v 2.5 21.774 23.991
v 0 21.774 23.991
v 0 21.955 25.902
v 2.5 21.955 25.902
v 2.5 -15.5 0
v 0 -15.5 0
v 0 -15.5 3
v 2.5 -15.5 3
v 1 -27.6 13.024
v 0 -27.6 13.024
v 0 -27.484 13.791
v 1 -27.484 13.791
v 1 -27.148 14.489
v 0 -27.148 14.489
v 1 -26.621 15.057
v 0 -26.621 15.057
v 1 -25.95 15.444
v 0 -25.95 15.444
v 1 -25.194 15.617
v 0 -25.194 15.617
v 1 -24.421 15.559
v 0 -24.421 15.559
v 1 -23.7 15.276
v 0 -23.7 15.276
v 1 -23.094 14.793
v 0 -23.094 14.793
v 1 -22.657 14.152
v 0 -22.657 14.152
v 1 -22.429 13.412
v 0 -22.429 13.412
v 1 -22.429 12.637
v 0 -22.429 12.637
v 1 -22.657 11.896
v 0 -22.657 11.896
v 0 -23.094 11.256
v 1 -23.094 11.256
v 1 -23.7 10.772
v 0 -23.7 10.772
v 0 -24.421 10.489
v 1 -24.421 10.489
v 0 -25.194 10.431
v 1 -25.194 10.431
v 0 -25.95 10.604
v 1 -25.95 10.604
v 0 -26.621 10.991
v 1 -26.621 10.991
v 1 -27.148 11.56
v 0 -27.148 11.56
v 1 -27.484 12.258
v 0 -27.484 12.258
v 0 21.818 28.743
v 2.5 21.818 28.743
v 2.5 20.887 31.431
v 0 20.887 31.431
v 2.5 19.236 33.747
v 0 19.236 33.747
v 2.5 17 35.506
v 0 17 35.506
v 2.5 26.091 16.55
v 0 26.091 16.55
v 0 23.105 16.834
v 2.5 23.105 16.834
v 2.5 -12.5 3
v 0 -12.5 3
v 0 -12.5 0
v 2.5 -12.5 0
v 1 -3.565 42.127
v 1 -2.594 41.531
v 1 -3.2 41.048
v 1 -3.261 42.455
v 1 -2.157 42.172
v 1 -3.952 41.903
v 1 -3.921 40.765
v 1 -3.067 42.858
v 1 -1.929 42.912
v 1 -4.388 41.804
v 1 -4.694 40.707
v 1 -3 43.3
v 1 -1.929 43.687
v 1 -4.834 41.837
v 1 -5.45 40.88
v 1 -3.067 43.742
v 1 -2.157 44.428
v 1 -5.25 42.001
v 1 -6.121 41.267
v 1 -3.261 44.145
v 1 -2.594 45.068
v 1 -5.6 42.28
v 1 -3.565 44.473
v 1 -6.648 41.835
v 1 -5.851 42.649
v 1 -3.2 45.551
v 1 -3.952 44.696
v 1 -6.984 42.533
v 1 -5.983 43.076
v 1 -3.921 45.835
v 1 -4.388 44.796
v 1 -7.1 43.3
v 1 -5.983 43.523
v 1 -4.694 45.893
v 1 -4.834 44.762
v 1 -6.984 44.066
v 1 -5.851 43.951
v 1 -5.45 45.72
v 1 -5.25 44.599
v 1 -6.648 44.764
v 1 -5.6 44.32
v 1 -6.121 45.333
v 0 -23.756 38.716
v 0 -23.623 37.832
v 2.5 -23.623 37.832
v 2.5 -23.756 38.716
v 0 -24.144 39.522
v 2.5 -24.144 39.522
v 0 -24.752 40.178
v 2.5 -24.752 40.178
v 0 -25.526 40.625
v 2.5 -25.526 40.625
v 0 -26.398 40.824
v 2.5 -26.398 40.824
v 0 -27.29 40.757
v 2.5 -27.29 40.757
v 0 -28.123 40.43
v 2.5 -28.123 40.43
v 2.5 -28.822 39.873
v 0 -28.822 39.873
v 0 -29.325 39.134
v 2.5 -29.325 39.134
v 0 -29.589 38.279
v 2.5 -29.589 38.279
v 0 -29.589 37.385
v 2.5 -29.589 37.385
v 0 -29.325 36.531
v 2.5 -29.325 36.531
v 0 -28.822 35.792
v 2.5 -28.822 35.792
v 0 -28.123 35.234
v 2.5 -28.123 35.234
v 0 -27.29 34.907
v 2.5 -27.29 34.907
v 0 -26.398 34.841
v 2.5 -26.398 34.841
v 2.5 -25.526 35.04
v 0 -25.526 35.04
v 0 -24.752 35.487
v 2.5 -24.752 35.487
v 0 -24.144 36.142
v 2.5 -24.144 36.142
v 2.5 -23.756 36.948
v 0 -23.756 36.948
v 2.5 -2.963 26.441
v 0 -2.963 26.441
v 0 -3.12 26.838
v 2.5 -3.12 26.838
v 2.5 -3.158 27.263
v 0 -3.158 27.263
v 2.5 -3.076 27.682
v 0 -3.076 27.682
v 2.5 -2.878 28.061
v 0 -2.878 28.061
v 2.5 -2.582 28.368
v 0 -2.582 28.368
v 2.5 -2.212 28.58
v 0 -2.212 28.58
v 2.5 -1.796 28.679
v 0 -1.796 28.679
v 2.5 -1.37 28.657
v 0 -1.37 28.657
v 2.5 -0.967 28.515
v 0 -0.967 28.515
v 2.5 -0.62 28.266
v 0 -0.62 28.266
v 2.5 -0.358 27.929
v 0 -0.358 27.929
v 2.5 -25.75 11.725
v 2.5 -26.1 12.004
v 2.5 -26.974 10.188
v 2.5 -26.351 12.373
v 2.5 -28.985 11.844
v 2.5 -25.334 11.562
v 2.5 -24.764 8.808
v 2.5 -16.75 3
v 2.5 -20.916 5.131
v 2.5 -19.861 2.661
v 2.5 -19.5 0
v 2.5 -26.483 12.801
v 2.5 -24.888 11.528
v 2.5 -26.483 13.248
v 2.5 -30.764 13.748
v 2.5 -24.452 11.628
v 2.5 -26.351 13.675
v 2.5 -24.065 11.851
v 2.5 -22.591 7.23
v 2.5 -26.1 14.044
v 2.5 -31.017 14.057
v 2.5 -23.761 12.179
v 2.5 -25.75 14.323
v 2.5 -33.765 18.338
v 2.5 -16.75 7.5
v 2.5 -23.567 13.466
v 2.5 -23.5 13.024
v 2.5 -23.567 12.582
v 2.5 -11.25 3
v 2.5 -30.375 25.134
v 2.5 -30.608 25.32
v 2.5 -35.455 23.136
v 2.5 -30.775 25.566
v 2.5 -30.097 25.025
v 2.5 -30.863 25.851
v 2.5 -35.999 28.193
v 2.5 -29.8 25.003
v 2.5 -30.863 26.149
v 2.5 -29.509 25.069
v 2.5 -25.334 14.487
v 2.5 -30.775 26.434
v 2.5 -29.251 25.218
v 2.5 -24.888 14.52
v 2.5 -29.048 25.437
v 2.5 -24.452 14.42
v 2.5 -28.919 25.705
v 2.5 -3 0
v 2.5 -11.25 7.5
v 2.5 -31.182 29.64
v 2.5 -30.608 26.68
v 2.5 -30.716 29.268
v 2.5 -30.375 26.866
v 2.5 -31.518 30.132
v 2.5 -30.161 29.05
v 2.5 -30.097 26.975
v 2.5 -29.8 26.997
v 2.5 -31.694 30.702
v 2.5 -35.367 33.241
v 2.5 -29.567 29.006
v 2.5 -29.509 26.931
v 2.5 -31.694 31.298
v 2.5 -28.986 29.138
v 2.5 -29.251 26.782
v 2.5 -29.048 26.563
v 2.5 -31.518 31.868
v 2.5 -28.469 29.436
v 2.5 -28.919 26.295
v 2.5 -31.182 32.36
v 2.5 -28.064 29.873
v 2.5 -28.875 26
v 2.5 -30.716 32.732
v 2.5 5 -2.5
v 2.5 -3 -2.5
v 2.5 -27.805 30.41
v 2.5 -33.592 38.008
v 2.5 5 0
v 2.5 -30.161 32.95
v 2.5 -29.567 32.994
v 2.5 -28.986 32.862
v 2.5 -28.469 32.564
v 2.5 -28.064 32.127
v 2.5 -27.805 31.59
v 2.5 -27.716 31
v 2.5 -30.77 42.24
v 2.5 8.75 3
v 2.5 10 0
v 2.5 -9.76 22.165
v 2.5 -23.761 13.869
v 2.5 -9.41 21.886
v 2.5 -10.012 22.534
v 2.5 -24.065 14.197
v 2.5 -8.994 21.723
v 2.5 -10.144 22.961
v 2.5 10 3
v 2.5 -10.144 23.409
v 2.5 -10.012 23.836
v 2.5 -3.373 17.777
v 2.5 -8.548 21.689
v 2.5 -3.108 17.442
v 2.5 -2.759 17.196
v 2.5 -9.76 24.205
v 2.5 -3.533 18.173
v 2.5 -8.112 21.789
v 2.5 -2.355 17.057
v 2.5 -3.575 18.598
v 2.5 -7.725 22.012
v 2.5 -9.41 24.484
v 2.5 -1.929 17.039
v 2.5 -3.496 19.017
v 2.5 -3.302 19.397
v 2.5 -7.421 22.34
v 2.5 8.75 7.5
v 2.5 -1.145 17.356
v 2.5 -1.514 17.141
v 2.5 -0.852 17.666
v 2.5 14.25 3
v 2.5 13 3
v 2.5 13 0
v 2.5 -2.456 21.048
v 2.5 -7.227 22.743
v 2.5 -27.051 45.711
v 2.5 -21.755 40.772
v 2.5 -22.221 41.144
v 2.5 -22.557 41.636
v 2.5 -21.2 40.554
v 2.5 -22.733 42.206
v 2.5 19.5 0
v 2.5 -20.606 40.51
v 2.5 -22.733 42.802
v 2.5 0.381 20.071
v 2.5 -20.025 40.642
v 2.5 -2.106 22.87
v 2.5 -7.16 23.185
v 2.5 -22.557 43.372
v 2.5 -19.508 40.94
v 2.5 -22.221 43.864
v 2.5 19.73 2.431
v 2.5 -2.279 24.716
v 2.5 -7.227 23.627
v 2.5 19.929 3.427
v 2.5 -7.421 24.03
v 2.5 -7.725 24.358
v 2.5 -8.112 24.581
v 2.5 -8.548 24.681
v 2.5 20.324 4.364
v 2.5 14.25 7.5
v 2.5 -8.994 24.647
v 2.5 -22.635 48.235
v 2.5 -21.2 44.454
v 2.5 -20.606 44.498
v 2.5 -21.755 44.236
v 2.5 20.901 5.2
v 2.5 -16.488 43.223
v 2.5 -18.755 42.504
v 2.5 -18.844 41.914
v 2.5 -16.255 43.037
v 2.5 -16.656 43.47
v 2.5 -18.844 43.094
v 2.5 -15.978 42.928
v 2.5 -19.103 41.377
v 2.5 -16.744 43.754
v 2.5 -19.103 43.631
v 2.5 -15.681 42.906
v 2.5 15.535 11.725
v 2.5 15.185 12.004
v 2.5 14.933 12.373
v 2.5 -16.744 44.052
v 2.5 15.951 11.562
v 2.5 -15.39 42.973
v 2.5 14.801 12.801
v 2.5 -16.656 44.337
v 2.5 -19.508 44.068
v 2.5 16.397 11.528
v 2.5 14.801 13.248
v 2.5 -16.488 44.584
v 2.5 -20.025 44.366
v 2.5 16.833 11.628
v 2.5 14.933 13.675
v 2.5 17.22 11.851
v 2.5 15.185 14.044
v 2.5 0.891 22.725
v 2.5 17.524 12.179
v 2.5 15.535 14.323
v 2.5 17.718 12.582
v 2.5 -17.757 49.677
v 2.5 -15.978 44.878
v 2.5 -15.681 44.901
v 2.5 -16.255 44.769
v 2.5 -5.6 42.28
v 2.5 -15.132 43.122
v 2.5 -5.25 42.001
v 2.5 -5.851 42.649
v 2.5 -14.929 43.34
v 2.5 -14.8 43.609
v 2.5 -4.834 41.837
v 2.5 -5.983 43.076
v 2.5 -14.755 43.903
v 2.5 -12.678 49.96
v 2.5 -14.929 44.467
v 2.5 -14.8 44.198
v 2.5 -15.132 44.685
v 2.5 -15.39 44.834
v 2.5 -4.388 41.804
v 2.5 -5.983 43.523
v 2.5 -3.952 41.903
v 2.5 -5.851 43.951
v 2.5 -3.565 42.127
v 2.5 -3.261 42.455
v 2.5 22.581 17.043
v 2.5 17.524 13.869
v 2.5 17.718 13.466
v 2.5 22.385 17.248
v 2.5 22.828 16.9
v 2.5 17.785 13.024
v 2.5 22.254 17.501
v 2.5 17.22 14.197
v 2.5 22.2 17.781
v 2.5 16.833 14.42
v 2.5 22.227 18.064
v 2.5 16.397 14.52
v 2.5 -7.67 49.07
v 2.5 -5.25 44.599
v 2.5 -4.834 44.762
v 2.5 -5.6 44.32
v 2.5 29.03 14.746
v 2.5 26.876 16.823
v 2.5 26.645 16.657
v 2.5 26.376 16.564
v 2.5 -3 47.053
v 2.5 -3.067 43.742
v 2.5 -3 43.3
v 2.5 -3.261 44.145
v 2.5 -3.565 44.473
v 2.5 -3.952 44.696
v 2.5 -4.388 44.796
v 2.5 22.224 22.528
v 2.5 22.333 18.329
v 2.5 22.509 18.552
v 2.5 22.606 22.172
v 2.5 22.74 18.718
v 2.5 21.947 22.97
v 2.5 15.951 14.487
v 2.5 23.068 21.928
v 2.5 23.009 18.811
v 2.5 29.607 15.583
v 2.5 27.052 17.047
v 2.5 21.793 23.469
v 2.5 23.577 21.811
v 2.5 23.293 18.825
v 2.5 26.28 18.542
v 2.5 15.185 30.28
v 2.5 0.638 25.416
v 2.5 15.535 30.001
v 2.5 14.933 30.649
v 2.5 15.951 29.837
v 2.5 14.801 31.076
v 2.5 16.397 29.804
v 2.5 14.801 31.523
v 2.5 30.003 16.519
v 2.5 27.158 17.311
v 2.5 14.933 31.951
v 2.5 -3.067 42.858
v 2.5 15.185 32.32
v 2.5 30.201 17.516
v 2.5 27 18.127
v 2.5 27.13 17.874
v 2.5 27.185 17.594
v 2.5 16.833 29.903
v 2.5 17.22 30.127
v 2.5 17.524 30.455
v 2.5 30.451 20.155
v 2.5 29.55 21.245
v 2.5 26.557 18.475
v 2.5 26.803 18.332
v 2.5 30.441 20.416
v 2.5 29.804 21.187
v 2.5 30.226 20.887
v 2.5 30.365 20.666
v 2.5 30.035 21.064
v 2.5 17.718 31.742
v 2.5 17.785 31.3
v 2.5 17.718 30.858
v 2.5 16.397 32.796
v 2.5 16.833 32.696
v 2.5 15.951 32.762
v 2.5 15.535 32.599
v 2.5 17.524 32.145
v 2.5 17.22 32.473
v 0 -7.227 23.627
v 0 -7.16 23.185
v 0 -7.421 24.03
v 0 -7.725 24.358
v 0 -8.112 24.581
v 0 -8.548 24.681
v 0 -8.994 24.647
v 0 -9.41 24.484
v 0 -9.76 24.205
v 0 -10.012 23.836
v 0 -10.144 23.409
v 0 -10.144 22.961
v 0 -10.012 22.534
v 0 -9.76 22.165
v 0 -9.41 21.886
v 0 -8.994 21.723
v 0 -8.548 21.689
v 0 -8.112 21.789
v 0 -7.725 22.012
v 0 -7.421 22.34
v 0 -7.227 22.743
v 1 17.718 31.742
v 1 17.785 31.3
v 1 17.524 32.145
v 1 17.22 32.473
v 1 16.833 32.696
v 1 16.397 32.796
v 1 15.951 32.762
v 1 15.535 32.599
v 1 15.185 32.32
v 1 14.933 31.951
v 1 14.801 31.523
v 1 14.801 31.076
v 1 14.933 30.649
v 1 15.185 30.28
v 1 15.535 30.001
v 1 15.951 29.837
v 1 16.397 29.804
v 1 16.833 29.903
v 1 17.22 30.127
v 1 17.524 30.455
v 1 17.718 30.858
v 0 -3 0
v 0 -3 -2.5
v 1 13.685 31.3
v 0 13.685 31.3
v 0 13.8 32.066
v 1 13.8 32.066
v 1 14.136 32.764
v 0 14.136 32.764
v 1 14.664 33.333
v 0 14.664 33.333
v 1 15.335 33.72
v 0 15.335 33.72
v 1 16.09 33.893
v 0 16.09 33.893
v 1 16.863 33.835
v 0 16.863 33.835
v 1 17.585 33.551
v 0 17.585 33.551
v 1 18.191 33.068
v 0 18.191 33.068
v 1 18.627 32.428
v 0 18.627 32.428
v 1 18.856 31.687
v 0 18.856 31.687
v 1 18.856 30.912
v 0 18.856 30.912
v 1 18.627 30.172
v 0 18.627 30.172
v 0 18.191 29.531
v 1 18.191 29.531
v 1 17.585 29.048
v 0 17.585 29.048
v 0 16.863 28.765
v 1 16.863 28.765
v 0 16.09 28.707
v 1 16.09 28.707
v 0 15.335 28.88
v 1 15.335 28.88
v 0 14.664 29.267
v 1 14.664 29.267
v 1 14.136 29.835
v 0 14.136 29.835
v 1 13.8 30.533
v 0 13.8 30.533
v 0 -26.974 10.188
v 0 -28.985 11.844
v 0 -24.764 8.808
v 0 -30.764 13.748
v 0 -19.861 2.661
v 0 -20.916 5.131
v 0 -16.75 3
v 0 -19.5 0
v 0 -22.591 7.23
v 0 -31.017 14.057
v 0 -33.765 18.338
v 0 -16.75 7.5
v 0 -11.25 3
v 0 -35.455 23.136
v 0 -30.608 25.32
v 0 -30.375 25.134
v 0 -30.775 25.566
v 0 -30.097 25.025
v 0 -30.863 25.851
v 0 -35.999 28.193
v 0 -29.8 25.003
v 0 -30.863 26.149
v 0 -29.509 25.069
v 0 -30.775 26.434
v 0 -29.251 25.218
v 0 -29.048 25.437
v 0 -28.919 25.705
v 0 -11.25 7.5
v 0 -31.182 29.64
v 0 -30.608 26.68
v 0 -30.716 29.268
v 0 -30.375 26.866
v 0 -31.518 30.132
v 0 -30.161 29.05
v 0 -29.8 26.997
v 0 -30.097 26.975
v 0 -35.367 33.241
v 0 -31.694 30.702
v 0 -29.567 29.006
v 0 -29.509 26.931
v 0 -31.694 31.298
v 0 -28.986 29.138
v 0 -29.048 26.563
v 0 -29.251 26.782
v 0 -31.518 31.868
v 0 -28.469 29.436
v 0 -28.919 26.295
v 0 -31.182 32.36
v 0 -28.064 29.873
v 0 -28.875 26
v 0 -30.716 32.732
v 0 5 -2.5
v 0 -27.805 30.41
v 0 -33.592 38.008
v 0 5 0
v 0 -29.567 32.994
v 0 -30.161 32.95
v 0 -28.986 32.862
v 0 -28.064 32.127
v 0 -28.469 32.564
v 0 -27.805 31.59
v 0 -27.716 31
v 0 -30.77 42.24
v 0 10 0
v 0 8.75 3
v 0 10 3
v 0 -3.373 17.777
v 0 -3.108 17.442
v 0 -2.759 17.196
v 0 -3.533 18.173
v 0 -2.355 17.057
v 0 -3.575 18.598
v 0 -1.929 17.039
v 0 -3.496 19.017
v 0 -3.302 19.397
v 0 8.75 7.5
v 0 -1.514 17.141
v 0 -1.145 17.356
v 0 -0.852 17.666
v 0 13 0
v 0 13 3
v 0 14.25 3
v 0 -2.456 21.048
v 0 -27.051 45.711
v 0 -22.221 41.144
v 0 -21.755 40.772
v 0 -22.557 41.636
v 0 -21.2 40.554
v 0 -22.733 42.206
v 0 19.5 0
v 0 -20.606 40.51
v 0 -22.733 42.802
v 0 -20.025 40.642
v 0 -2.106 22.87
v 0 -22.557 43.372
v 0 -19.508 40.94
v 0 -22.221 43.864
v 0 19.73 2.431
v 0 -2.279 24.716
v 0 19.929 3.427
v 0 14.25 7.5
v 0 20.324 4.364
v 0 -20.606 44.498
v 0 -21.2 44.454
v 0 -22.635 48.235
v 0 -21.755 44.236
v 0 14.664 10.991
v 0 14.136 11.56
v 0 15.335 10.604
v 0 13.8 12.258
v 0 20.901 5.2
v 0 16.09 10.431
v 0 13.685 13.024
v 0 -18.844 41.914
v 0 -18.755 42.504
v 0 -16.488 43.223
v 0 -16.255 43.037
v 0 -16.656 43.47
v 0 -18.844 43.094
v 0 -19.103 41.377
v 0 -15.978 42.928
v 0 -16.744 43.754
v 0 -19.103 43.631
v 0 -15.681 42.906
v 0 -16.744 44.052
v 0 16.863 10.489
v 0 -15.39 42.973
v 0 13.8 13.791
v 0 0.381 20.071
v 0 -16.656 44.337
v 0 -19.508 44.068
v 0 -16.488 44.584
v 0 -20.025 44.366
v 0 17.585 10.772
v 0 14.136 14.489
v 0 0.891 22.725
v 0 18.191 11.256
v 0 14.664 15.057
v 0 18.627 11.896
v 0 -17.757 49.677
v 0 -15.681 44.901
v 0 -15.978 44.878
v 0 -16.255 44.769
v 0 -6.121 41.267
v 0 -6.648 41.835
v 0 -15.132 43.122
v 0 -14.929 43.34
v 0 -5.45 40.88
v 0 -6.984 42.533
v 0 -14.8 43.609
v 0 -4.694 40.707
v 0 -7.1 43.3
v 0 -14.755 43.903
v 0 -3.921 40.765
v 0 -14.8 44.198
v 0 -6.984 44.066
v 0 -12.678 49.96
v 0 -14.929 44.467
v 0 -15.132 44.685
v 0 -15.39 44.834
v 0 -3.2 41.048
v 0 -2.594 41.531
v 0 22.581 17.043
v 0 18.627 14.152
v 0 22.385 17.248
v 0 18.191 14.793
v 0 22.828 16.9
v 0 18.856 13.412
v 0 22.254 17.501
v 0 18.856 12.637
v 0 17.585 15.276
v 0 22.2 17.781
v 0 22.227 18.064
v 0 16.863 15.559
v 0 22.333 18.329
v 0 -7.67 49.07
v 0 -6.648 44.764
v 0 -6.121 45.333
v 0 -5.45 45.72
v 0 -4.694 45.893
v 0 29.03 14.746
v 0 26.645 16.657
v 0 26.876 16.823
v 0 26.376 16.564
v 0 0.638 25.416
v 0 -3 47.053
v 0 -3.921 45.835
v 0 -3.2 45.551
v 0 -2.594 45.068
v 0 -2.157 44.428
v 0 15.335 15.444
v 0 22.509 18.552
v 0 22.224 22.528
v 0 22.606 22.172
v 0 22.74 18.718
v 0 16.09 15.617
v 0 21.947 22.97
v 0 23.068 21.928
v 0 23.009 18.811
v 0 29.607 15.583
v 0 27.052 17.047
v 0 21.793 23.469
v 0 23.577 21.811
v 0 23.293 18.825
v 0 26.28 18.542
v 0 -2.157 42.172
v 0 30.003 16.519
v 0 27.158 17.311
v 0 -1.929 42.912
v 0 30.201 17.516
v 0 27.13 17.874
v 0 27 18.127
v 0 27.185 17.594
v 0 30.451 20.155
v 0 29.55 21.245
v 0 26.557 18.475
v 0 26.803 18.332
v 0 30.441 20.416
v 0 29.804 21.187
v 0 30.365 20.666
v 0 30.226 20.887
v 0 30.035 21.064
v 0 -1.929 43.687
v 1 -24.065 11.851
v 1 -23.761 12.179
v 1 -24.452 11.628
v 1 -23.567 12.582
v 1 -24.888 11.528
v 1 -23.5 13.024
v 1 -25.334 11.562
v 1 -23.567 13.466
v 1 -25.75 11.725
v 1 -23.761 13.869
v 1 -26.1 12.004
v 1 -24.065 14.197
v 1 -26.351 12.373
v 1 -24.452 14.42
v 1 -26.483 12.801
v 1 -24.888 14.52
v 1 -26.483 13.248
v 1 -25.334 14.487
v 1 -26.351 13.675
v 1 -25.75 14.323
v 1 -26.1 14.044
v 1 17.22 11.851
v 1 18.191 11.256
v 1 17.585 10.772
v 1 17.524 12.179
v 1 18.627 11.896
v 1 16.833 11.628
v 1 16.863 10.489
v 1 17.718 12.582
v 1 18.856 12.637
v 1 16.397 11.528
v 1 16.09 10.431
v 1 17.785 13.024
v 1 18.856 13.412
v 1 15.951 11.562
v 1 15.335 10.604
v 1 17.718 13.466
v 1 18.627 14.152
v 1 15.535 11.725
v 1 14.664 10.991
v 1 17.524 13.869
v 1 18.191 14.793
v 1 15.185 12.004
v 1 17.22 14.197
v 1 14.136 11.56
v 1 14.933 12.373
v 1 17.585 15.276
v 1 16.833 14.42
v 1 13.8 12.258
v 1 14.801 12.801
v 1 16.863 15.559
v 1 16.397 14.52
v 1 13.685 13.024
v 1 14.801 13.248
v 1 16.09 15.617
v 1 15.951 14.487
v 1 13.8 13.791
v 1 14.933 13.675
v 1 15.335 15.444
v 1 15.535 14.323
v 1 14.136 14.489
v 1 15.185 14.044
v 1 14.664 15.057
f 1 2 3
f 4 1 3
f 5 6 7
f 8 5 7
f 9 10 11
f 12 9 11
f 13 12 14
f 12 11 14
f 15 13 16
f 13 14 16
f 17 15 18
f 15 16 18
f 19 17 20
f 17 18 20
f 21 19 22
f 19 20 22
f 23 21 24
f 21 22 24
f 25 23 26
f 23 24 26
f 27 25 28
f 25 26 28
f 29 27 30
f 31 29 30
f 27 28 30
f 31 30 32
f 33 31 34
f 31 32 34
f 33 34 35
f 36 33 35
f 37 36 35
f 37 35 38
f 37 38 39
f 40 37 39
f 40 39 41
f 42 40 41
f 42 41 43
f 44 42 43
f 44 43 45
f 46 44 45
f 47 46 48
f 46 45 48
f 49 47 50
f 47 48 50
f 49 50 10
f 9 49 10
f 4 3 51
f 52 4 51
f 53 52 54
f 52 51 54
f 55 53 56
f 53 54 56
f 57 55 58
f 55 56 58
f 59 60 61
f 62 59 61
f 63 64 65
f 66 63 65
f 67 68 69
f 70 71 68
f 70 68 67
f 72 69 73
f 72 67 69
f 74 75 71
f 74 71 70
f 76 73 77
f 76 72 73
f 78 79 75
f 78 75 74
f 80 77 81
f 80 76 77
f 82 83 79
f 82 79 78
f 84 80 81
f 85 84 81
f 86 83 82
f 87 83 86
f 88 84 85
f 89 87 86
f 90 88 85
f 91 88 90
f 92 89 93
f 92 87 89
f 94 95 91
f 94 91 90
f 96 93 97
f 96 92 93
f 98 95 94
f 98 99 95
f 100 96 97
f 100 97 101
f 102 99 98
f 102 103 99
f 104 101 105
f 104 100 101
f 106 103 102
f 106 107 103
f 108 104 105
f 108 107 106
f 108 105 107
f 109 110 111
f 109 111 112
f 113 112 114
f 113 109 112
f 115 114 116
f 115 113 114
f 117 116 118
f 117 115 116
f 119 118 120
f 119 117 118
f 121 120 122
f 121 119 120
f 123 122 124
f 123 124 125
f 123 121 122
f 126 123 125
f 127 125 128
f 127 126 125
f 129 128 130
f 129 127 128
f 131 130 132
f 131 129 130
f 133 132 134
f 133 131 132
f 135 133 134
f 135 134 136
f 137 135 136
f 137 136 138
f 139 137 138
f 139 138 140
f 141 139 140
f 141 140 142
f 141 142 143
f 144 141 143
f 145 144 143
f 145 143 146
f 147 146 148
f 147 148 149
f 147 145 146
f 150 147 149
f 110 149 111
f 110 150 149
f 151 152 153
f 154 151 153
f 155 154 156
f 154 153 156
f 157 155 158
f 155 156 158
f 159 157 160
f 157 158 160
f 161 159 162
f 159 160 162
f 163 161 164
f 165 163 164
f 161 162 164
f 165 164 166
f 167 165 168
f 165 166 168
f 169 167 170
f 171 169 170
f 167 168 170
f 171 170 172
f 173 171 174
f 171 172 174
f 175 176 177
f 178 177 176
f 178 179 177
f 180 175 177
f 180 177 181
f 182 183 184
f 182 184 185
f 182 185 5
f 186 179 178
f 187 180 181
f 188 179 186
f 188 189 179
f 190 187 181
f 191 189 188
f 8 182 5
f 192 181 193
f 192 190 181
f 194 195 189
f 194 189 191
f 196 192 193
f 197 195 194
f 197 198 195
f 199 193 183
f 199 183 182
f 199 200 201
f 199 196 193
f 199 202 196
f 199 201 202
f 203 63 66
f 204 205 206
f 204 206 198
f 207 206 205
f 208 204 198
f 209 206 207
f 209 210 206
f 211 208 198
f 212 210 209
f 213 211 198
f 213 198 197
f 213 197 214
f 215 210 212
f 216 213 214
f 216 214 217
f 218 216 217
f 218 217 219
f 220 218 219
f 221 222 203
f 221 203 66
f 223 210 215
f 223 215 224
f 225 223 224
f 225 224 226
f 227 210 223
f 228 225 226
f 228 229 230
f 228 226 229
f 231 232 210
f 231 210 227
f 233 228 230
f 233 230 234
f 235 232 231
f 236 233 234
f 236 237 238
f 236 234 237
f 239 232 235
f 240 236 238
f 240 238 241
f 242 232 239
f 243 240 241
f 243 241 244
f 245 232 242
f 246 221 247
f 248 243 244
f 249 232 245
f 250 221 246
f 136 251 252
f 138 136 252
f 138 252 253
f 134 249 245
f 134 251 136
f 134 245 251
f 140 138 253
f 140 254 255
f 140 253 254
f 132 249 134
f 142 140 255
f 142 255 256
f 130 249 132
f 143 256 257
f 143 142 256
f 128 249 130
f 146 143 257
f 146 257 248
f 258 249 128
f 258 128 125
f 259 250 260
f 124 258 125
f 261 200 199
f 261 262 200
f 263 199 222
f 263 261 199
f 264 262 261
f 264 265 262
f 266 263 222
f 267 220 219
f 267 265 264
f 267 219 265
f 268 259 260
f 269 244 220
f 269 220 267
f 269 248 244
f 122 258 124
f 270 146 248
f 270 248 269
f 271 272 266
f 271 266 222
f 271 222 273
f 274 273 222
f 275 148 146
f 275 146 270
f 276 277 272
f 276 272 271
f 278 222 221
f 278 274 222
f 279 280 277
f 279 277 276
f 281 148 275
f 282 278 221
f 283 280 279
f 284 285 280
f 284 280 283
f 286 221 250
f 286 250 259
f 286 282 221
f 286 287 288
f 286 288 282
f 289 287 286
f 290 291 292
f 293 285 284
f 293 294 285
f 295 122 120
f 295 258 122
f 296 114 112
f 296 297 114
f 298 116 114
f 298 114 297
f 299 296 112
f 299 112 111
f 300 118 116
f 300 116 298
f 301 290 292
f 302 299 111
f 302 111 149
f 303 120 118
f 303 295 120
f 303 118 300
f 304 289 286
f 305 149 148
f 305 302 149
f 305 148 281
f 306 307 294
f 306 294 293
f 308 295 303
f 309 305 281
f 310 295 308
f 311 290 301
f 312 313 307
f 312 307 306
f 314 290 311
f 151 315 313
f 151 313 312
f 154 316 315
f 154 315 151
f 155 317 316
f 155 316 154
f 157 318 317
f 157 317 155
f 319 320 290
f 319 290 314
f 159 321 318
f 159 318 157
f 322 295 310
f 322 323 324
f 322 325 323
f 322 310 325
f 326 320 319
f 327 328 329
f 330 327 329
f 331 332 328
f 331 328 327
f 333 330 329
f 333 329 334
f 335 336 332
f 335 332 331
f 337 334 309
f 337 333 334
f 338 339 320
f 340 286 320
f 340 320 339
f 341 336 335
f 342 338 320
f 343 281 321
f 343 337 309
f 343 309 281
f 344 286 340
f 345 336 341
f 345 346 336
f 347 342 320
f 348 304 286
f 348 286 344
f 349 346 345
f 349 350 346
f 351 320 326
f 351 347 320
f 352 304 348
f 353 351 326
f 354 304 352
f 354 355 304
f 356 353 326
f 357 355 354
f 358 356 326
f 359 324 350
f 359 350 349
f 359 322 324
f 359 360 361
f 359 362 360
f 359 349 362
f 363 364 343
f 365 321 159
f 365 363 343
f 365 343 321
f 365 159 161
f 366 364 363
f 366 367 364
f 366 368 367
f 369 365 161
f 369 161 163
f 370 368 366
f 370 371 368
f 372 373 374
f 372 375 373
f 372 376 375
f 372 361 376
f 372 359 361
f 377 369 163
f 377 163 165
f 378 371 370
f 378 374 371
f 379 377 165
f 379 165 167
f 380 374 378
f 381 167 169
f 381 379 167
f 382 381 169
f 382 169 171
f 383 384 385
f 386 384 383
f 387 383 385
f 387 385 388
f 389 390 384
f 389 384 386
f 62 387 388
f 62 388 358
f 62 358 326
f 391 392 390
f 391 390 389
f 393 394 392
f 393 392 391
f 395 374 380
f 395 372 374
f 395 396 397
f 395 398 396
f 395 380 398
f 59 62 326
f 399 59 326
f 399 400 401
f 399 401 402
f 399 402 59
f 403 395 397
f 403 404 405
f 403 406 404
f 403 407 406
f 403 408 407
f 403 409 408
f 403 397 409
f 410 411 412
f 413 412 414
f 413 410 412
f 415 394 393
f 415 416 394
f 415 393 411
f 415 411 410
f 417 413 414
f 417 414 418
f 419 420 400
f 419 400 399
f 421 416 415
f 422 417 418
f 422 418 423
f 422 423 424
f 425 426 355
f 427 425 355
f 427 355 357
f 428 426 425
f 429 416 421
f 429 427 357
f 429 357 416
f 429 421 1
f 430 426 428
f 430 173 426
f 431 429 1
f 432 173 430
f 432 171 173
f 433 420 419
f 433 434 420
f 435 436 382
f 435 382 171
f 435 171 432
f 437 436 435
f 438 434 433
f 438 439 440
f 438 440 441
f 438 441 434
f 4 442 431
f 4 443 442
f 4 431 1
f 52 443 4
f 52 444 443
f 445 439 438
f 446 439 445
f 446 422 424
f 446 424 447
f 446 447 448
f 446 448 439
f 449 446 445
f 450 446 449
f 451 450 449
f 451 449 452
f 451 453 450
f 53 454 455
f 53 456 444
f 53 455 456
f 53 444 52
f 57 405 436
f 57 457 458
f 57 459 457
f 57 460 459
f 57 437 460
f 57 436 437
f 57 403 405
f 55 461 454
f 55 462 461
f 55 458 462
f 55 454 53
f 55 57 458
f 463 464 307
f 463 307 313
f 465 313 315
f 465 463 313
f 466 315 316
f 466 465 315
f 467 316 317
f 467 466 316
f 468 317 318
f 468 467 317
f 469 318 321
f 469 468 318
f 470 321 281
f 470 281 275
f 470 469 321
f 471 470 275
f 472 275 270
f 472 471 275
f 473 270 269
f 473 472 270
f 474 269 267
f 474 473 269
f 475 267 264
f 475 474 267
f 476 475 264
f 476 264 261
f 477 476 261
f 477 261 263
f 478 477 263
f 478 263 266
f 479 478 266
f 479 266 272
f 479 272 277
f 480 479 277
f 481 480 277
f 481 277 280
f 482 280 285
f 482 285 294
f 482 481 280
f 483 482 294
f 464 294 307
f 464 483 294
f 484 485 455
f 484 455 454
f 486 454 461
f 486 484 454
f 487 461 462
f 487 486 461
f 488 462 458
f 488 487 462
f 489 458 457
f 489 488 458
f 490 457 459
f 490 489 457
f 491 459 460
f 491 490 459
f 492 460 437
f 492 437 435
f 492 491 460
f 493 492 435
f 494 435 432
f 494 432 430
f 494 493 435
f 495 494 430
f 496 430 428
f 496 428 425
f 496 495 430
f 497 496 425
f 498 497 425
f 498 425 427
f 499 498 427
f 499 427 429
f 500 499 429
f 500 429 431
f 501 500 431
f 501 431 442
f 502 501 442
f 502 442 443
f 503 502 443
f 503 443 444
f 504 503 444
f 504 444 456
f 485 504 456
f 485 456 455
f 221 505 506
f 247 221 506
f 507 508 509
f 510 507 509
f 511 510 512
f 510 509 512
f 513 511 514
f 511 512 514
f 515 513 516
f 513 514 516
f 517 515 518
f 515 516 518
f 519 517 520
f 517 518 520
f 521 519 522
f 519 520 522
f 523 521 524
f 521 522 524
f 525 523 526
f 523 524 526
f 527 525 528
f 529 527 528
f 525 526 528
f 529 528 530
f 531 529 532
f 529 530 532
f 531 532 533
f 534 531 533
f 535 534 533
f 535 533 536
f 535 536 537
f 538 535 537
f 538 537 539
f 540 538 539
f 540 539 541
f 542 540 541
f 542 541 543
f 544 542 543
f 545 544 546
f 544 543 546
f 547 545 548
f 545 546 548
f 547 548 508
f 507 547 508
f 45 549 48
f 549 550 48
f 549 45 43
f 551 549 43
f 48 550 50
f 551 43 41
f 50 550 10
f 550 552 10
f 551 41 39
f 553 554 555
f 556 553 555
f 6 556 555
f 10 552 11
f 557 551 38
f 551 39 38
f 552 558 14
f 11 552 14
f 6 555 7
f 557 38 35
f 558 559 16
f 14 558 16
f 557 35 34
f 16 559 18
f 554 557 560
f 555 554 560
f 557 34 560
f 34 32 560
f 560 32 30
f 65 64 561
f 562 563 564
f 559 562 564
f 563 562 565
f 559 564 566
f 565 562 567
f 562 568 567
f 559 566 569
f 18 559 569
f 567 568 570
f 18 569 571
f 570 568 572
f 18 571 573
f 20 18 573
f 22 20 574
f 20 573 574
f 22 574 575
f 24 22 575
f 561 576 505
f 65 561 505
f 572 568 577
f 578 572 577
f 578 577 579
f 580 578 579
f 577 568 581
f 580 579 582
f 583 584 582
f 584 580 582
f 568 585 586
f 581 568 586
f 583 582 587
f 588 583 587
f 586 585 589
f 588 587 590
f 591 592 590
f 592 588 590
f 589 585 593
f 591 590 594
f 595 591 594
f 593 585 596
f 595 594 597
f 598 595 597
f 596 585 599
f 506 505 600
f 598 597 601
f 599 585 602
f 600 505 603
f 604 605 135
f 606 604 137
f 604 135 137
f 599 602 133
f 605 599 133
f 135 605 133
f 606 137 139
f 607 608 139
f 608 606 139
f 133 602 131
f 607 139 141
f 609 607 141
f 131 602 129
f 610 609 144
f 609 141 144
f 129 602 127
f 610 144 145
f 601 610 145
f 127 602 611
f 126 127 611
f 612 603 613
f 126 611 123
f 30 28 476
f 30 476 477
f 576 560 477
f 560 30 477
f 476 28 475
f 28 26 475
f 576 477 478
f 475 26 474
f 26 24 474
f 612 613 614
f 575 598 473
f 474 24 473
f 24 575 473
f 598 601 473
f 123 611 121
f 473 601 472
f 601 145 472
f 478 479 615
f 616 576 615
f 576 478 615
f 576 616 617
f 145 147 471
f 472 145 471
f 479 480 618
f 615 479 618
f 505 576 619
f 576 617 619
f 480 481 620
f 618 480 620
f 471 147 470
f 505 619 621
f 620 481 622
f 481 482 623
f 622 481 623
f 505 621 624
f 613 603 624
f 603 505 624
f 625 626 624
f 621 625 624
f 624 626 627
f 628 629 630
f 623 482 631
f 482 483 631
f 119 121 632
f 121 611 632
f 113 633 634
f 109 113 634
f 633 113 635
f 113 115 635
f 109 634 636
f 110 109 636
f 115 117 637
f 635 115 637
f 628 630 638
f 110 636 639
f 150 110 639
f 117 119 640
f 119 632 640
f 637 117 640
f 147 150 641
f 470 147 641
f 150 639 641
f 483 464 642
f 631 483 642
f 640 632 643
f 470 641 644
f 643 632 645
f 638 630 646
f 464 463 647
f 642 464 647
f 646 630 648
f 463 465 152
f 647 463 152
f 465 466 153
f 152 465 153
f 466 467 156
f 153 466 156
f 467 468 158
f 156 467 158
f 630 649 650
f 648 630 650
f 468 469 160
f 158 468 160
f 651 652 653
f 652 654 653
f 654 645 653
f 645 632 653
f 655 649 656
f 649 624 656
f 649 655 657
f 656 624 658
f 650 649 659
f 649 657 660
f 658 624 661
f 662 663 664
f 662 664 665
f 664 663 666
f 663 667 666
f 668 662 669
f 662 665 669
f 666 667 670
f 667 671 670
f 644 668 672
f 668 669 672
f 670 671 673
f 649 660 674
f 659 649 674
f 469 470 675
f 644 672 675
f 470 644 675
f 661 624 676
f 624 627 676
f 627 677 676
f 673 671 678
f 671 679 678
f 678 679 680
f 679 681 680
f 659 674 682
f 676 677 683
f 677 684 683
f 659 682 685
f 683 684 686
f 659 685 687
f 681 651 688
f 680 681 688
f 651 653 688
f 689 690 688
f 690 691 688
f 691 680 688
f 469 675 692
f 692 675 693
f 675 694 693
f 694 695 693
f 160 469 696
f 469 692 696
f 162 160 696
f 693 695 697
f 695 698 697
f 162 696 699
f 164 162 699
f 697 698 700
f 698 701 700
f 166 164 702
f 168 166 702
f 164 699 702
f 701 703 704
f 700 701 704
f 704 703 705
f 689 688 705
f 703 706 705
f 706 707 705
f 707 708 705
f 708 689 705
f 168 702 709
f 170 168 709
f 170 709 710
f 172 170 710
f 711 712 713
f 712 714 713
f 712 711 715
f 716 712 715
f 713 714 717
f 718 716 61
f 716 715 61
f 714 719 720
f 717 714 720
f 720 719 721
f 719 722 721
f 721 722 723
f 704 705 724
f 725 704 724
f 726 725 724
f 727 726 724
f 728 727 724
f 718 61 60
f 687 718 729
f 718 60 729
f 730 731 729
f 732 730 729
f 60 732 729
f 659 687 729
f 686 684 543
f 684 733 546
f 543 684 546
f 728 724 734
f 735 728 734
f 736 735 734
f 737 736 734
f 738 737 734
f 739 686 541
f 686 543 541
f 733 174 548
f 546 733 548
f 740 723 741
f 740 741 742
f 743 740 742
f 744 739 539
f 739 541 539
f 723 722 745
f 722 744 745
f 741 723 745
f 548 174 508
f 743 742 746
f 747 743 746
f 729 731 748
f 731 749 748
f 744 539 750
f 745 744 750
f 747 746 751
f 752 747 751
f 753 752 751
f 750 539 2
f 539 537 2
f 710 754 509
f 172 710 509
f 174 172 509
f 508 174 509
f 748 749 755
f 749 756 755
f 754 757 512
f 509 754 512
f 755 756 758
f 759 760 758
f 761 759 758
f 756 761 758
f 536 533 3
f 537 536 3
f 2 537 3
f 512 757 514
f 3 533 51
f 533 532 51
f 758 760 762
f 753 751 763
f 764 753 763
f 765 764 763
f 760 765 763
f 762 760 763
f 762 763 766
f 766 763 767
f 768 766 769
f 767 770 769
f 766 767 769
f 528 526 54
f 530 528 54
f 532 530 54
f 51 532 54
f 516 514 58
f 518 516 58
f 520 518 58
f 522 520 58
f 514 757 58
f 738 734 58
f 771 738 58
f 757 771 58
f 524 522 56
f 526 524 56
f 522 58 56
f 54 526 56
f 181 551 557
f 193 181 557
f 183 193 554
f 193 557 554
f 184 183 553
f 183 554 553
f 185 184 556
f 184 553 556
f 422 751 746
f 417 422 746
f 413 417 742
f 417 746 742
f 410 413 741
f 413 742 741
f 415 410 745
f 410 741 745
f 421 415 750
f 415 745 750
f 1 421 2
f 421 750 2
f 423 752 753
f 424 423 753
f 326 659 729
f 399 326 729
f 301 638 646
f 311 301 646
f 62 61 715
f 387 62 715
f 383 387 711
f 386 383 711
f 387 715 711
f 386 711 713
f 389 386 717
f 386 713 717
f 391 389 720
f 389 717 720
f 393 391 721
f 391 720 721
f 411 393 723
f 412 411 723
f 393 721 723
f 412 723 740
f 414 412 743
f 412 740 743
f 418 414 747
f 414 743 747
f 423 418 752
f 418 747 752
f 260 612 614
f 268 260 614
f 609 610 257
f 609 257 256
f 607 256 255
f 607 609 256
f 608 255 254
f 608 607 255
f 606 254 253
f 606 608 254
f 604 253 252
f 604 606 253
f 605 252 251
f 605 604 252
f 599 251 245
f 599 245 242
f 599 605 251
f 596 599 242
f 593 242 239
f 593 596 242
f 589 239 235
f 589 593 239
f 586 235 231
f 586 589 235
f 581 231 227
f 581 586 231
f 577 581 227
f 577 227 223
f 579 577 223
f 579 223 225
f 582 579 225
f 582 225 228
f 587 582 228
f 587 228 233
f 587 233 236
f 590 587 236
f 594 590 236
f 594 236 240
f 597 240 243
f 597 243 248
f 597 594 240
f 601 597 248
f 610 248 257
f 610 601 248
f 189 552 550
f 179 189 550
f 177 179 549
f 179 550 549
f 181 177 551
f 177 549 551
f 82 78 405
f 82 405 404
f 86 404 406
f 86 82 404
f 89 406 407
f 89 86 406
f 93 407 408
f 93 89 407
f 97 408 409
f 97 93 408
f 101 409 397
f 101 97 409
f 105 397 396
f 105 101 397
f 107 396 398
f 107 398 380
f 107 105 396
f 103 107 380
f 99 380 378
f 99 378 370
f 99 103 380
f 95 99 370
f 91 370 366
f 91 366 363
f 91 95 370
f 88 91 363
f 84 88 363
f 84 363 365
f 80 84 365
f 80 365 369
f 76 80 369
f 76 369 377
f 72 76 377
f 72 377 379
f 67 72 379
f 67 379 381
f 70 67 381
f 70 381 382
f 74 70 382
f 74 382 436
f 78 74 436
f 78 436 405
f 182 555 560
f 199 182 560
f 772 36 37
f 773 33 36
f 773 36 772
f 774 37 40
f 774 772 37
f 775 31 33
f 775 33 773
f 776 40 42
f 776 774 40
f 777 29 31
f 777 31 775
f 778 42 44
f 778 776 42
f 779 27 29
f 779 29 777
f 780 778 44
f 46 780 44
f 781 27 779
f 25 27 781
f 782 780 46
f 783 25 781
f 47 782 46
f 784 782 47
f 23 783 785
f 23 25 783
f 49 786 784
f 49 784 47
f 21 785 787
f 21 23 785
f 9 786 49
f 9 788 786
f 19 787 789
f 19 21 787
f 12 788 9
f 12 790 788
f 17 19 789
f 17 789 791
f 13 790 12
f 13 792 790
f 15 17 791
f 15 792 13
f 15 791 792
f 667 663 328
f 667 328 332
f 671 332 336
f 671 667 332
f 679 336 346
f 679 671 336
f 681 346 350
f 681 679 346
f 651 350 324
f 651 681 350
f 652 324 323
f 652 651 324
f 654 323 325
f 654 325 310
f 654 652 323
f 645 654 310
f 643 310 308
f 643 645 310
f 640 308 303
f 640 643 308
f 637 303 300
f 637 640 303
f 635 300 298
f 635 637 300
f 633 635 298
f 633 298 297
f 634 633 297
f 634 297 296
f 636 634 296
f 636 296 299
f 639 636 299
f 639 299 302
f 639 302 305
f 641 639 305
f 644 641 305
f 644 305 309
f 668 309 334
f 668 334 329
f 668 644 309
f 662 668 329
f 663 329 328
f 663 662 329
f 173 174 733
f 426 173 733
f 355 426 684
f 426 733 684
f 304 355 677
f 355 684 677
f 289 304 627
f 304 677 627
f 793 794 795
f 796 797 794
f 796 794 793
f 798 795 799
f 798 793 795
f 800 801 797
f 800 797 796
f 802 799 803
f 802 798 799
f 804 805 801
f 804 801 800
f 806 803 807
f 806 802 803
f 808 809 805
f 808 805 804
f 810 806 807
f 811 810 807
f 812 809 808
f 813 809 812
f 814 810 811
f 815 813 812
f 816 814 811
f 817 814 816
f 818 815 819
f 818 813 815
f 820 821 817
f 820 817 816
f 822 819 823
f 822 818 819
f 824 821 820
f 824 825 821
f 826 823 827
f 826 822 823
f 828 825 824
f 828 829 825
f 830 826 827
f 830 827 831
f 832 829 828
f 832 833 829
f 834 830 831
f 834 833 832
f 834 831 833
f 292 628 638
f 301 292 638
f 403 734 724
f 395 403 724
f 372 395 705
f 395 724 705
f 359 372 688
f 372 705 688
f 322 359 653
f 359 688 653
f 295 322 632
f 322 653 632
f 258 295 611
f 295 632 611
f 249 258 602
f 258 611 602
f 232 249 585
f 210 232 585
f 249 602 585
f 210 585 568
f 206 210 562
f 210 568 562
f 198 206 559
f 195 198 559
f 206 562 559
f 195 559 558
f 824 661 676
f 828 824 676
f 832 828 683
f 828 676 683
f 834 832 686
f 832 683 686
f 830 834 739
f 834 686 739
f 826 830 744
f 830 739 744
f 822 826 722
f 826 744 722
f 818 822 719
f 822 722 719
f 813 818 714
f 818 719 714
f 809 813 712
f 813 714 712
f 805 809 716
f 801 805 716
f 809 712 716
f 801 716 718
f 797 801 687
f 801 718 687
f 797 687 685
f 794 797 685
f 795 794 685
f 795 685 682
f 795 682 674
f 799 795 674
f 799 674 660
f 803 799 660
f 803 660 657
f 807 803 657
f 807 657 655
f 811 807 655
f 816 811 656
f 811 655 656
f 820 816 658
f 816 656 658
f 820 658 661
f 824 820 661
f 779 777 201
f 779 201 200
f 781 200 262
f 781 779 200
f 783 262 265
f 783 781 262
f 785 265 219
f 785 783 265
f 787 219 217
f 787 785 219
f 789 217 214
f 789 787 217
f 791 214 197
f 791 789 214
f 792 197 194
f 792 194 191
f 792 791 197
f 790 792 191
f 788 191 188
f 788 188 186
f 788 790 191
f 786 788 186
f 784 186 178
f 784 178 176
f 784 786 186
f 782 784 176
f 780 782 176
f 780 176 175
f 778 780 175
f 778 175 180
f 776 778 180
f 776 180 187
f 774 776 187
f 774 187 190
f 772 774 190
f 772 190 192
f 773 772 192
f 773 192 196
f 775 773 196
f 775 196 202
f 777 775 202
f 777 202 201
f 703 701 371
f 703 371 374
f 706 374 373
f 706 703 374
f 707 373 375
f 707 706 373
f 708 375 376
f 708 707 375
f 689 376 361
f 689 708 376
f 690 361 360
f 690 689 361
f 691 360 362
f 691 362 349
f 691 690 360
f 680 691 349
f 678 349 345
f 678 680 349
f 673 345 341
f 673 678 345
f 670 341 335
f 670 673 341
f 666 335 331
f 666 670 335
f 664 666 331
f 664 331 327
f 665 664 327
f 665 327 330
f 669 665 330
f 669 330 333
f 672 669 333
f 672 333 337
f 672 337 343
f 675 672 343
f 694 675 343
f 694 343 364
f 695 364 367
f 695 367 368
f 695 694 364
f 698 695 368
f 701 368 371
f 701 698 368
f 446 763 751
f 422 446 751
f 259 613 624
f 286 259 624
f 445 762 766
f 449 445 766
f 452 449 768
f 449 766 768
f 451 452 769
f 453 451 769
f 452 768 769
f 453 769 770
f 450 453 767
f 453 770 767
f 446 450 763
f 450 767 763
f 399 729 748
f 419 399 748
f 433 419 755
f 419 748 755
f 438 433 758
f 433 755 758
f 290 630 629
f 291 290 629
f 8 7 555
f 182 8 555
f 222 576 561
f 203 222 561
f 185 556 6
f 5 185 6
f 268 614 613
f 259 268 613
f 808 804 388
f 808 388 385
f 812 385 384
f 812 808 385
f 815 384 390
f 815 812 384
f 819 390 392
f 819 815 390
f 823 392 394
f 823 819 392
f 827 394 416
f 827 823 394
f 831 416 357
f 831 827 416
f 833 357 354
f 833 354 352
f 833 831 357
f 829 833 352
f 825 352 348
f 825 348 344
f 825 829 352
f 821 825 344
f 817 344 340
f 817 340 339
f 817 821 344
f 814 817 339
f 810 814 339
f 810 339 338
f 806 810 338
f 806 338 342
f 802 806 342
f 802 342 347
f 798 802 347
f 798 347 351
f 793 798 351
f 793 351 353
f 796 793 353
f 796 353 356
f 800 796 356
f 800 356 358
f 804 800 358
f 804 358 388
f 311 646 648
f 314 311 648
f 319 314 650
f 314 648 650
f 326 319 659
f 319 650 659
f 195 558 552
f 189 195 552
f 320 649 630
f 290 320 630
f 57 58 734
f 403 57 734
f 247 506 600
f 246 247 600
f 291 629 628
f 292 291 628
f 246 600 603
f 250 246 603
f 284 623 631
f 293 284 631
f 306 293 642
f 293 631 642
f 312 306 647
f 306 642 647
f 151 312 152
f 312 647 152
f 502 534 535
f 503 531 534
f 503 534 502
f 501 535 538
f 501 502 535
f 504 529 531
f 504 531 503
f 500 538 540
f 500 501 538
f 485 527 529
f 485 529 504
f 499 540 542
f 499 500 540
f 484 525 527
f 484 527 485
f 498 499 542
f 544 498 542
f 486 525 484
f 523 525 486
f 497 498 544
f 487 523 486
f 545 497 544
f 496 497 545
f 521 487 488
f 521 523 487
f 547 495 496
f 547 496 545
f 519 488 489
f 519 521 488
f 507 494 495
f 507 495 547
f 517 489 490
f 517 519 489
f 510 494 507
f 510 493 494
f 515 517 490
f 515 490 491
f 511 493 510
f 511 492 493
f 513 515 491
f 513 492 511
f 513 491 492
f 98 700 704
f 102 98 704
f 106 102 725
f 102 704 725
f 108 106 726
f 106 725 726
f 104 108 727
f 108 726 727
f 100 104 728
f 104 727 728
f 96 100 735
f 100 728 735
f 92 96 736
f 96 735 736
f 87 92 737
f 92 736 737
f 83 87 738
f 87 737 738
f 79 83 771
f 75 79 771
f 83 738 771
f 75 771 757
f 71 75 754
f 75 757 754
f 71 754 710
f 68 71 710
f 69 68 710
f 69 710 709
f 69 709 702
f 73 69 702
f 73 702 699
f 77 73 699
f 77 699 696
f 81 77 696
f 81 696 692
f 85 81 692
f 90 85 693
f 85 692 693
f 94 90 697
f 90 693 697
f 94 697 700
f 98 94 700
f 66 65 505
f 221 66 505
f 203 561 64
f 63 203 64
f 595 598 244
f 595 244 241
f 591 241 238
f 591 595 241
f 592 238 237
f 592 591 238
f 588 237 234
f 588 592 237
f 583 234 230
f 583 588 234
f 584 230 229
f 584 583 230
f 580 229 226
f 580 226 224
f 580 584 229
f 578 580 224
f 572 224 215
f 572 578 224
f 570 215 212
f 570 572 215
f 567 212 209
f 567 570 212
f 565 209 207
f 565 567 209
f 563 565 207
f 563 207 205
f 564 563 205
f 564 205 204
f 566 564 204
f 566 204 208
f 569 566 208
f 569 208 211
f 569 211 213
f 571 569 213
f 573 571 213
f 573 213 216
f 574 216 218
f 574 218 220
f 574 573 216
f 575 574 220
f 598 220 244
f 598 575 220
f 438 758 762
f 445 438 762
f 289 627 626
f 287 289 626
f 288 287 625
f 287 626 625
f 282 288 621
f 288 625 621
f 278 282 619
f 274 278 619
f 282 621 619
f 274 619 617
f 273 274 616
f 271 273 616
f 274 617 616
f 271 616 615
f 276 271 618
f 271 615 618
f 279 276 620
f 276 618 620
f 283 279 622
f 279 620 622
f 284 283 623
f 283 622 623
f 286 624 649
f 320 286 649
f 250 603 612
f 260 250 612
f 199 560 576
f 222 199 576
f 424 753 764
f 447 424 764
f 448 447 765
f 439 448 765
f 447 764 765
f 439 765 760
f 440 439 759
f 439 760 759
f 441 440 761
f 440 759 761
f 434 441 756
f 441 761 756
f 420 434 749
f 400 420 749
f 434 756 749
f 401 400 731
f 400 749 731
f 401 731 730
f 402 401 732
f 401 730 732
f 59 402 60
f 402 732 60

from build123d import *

# Parameters (mm, degrees)
F0_R     = 1.5
F0_R_2   = 1
F0_R_3   = 2
F0_R_4   = 3
F1_DEPTH = 2.5
F2_R     = 2.6
F3_DEPTH = 1


with BuildPart() as f1:
    # F0 (on Right) → F1 (new body)
    with BuildSketch(Plane.YZ):
        with BuildLine():
            ThreePointArc((-24.764499, 8.807669), (-20.91644, 5.130545), (-19.5, 0))
            Line((-19.5, 0), (-15.5, 0))
            Line((-15.5, 0), (-15.5, 3))
            Line((-15.5, 3), (-16.75, 3))
            Line((-16.75, 3), (-16.75, 7.5))
            Line((-16.75, 7.5), (-11.25, 7.5))
            Line((-11.25, 7.5), (-11.25, 3))
            Line((-11.25, 3), (-12.5, 3))
            Line((-12.5, 3), (-12.5, 0))
            Line((-12.5, 0), (-3, 0))
            Line((-3, 0), (-3, -2.5))
            Line((-3, -2.5), (5, -2.5))
            Line((5, -2.5), (5, 0))
            Line((5, 0), (10, 0))
            Line((10, 0), (10, 3))
            Line((10, 3), (8.75, 3))
            Line((8.75, 3), (8.75, 7.5))
            Line((8.75, 7.5), (14.25, 7.5))
            Line((14.25, 7.5), (14.25, 3))
            Line((14.25, 3), (13, 3))
            Line((13, 3), (13, 0))
            Line((13, 0), (19.5, 0))
            Line((19.5, 0), (19.730406, 2.430542))
            ThreePointArc((19.730406, 2.430542), (20.102681, 3.905521), (20.901261, 5.200289))
            Line((20.901261, 5.200289), (29.029949, 14.74632))
            ThreePointArc((29.029949, 14.74632), (29.828529, 16.041087), (30.200804, 17.516067))
            Line((30.200804, 17.516067), (30.450974, 20.155105))
            ThreePointArc((30.450974, 20.155105), (30.22612, 20.886698), (29.549811, 21.245015))
            Line((29.549811, 21.245015), (23.576589, 21.811254))
            ThreePointArc((23.576589, 21.811254), (22.22397, 22.52789), (21.774261, 23.991074))
            Line((21.774261, 23.991074), (21.955369, 25.901569))
            ThreePointArc((21.955369, 25.901569), (20.886782, 31.430613), (17, 35.505553))
            Line((17, 35.505553), (-3, 47.052559))
            ThreePointArc((-3, 47.052559), (-30.769889, 42.239762), (-31.017419, 14.056993))
            Line((-31.017419, 14.056993), (-30.763877, 13.747545))
            ThreePointArc((-30.763877, 13.747545), (-28.006432, 10.983406), (-24.764499, 8.807669))
        make_face()
        with Locations((-25, 13.024149)):
            Circle(F0_R, mode=Mode.SUBTRACT)
        with Locations((-8.660254, 23.185045)):
            Circle(F0_R, mode=Mode.SUBTRACT)
        with BuildLine():
            ThreePointArc((-2.962619, 26.440837), (-2.404462, 28.48741), (-0.357889, 27.929254))
            ThreePointArc((-0.357889, 27.929254), (0.890951, 22.725413), (-0.85181, 17.665537))
            ThreePointArc((-0.85181, 17.665537), (-2.942522, 17.306479), (-3.30158, 19.397191))
            ThreePointArc((-3.30158, 19.397191), (-2.105582, 22.869615), (-2.962619, 26.440837))
        make_face(mode=Mode.SUBTRACT)
        with Locations((16.28461, 13.024149)):
            Circle(F0_R, mode=Mode.SUBTRACT)
        with BuildLine():
            ThreePointArc((23.104724, 16.833569), (22.20356, 17.923479), (23.29347, 18.824643))
            Line((23.29347, 18.824643), (26.280081, 18.541524))
            ThreePointArc((26.280081, 18.541524), (27.181244, 17.451614), (26.091335, 16.55045))
            Line((26.091335, 16.55045), (23.104724, 16.833569))
        make_face(mode=Mode.SUBTRACT)
        with Locations((-29.874508, 26)):
            Circle(F0_R_2, mode=Mode.SUBTRACT)
        with Locations((-29.716234, 31)):
            Circle(F0_R_3, mode=Mode.SUBTRACT)
        with Locations((-26.622516, 37.832197)):
            Circle(F0_R_4, mode=Mode.SUBTRACT)
        with Locations((-20.755296, 42.503999)):
            Circle(F0_R_3, mode=Mode.SUBTRACT)
        with Locations((-4.5, 43.299782)):
            Circle(F0_R, mode=Mode.SUBTRACT)
        with Locations((-15.755296, 43.903425)):
            Circle(F0_R_2, mode=Mode.SUBTRACT)
        with Locations((16.28461, 31.299782)):
            Circle(F0_R, mode=Mode.SUBTRACT)
    extrude(amount=F1_DEPTH)

    # F2 (on face) → F3 (cut)
    with BuildSketch(Plane(origin=(0, 0, 0), x_dir=(0, -1, 0), z_dir=(-1, 0, 0))):
        with Locations((4.5, 43.299782)):
            Circle(F2_R)
        with Locations((-16.28461, 31.299782)):
            Circle(F2_R)
        with Locations((-16.28461, 13.024149)):
            Circle(F2_R)
        with Locations((25, 13.024149)):
            Circle(F2_R)
    extrude(amount=-F3_DEPTH, mode=Mode.SUBTRACT)


solid = f1.part
